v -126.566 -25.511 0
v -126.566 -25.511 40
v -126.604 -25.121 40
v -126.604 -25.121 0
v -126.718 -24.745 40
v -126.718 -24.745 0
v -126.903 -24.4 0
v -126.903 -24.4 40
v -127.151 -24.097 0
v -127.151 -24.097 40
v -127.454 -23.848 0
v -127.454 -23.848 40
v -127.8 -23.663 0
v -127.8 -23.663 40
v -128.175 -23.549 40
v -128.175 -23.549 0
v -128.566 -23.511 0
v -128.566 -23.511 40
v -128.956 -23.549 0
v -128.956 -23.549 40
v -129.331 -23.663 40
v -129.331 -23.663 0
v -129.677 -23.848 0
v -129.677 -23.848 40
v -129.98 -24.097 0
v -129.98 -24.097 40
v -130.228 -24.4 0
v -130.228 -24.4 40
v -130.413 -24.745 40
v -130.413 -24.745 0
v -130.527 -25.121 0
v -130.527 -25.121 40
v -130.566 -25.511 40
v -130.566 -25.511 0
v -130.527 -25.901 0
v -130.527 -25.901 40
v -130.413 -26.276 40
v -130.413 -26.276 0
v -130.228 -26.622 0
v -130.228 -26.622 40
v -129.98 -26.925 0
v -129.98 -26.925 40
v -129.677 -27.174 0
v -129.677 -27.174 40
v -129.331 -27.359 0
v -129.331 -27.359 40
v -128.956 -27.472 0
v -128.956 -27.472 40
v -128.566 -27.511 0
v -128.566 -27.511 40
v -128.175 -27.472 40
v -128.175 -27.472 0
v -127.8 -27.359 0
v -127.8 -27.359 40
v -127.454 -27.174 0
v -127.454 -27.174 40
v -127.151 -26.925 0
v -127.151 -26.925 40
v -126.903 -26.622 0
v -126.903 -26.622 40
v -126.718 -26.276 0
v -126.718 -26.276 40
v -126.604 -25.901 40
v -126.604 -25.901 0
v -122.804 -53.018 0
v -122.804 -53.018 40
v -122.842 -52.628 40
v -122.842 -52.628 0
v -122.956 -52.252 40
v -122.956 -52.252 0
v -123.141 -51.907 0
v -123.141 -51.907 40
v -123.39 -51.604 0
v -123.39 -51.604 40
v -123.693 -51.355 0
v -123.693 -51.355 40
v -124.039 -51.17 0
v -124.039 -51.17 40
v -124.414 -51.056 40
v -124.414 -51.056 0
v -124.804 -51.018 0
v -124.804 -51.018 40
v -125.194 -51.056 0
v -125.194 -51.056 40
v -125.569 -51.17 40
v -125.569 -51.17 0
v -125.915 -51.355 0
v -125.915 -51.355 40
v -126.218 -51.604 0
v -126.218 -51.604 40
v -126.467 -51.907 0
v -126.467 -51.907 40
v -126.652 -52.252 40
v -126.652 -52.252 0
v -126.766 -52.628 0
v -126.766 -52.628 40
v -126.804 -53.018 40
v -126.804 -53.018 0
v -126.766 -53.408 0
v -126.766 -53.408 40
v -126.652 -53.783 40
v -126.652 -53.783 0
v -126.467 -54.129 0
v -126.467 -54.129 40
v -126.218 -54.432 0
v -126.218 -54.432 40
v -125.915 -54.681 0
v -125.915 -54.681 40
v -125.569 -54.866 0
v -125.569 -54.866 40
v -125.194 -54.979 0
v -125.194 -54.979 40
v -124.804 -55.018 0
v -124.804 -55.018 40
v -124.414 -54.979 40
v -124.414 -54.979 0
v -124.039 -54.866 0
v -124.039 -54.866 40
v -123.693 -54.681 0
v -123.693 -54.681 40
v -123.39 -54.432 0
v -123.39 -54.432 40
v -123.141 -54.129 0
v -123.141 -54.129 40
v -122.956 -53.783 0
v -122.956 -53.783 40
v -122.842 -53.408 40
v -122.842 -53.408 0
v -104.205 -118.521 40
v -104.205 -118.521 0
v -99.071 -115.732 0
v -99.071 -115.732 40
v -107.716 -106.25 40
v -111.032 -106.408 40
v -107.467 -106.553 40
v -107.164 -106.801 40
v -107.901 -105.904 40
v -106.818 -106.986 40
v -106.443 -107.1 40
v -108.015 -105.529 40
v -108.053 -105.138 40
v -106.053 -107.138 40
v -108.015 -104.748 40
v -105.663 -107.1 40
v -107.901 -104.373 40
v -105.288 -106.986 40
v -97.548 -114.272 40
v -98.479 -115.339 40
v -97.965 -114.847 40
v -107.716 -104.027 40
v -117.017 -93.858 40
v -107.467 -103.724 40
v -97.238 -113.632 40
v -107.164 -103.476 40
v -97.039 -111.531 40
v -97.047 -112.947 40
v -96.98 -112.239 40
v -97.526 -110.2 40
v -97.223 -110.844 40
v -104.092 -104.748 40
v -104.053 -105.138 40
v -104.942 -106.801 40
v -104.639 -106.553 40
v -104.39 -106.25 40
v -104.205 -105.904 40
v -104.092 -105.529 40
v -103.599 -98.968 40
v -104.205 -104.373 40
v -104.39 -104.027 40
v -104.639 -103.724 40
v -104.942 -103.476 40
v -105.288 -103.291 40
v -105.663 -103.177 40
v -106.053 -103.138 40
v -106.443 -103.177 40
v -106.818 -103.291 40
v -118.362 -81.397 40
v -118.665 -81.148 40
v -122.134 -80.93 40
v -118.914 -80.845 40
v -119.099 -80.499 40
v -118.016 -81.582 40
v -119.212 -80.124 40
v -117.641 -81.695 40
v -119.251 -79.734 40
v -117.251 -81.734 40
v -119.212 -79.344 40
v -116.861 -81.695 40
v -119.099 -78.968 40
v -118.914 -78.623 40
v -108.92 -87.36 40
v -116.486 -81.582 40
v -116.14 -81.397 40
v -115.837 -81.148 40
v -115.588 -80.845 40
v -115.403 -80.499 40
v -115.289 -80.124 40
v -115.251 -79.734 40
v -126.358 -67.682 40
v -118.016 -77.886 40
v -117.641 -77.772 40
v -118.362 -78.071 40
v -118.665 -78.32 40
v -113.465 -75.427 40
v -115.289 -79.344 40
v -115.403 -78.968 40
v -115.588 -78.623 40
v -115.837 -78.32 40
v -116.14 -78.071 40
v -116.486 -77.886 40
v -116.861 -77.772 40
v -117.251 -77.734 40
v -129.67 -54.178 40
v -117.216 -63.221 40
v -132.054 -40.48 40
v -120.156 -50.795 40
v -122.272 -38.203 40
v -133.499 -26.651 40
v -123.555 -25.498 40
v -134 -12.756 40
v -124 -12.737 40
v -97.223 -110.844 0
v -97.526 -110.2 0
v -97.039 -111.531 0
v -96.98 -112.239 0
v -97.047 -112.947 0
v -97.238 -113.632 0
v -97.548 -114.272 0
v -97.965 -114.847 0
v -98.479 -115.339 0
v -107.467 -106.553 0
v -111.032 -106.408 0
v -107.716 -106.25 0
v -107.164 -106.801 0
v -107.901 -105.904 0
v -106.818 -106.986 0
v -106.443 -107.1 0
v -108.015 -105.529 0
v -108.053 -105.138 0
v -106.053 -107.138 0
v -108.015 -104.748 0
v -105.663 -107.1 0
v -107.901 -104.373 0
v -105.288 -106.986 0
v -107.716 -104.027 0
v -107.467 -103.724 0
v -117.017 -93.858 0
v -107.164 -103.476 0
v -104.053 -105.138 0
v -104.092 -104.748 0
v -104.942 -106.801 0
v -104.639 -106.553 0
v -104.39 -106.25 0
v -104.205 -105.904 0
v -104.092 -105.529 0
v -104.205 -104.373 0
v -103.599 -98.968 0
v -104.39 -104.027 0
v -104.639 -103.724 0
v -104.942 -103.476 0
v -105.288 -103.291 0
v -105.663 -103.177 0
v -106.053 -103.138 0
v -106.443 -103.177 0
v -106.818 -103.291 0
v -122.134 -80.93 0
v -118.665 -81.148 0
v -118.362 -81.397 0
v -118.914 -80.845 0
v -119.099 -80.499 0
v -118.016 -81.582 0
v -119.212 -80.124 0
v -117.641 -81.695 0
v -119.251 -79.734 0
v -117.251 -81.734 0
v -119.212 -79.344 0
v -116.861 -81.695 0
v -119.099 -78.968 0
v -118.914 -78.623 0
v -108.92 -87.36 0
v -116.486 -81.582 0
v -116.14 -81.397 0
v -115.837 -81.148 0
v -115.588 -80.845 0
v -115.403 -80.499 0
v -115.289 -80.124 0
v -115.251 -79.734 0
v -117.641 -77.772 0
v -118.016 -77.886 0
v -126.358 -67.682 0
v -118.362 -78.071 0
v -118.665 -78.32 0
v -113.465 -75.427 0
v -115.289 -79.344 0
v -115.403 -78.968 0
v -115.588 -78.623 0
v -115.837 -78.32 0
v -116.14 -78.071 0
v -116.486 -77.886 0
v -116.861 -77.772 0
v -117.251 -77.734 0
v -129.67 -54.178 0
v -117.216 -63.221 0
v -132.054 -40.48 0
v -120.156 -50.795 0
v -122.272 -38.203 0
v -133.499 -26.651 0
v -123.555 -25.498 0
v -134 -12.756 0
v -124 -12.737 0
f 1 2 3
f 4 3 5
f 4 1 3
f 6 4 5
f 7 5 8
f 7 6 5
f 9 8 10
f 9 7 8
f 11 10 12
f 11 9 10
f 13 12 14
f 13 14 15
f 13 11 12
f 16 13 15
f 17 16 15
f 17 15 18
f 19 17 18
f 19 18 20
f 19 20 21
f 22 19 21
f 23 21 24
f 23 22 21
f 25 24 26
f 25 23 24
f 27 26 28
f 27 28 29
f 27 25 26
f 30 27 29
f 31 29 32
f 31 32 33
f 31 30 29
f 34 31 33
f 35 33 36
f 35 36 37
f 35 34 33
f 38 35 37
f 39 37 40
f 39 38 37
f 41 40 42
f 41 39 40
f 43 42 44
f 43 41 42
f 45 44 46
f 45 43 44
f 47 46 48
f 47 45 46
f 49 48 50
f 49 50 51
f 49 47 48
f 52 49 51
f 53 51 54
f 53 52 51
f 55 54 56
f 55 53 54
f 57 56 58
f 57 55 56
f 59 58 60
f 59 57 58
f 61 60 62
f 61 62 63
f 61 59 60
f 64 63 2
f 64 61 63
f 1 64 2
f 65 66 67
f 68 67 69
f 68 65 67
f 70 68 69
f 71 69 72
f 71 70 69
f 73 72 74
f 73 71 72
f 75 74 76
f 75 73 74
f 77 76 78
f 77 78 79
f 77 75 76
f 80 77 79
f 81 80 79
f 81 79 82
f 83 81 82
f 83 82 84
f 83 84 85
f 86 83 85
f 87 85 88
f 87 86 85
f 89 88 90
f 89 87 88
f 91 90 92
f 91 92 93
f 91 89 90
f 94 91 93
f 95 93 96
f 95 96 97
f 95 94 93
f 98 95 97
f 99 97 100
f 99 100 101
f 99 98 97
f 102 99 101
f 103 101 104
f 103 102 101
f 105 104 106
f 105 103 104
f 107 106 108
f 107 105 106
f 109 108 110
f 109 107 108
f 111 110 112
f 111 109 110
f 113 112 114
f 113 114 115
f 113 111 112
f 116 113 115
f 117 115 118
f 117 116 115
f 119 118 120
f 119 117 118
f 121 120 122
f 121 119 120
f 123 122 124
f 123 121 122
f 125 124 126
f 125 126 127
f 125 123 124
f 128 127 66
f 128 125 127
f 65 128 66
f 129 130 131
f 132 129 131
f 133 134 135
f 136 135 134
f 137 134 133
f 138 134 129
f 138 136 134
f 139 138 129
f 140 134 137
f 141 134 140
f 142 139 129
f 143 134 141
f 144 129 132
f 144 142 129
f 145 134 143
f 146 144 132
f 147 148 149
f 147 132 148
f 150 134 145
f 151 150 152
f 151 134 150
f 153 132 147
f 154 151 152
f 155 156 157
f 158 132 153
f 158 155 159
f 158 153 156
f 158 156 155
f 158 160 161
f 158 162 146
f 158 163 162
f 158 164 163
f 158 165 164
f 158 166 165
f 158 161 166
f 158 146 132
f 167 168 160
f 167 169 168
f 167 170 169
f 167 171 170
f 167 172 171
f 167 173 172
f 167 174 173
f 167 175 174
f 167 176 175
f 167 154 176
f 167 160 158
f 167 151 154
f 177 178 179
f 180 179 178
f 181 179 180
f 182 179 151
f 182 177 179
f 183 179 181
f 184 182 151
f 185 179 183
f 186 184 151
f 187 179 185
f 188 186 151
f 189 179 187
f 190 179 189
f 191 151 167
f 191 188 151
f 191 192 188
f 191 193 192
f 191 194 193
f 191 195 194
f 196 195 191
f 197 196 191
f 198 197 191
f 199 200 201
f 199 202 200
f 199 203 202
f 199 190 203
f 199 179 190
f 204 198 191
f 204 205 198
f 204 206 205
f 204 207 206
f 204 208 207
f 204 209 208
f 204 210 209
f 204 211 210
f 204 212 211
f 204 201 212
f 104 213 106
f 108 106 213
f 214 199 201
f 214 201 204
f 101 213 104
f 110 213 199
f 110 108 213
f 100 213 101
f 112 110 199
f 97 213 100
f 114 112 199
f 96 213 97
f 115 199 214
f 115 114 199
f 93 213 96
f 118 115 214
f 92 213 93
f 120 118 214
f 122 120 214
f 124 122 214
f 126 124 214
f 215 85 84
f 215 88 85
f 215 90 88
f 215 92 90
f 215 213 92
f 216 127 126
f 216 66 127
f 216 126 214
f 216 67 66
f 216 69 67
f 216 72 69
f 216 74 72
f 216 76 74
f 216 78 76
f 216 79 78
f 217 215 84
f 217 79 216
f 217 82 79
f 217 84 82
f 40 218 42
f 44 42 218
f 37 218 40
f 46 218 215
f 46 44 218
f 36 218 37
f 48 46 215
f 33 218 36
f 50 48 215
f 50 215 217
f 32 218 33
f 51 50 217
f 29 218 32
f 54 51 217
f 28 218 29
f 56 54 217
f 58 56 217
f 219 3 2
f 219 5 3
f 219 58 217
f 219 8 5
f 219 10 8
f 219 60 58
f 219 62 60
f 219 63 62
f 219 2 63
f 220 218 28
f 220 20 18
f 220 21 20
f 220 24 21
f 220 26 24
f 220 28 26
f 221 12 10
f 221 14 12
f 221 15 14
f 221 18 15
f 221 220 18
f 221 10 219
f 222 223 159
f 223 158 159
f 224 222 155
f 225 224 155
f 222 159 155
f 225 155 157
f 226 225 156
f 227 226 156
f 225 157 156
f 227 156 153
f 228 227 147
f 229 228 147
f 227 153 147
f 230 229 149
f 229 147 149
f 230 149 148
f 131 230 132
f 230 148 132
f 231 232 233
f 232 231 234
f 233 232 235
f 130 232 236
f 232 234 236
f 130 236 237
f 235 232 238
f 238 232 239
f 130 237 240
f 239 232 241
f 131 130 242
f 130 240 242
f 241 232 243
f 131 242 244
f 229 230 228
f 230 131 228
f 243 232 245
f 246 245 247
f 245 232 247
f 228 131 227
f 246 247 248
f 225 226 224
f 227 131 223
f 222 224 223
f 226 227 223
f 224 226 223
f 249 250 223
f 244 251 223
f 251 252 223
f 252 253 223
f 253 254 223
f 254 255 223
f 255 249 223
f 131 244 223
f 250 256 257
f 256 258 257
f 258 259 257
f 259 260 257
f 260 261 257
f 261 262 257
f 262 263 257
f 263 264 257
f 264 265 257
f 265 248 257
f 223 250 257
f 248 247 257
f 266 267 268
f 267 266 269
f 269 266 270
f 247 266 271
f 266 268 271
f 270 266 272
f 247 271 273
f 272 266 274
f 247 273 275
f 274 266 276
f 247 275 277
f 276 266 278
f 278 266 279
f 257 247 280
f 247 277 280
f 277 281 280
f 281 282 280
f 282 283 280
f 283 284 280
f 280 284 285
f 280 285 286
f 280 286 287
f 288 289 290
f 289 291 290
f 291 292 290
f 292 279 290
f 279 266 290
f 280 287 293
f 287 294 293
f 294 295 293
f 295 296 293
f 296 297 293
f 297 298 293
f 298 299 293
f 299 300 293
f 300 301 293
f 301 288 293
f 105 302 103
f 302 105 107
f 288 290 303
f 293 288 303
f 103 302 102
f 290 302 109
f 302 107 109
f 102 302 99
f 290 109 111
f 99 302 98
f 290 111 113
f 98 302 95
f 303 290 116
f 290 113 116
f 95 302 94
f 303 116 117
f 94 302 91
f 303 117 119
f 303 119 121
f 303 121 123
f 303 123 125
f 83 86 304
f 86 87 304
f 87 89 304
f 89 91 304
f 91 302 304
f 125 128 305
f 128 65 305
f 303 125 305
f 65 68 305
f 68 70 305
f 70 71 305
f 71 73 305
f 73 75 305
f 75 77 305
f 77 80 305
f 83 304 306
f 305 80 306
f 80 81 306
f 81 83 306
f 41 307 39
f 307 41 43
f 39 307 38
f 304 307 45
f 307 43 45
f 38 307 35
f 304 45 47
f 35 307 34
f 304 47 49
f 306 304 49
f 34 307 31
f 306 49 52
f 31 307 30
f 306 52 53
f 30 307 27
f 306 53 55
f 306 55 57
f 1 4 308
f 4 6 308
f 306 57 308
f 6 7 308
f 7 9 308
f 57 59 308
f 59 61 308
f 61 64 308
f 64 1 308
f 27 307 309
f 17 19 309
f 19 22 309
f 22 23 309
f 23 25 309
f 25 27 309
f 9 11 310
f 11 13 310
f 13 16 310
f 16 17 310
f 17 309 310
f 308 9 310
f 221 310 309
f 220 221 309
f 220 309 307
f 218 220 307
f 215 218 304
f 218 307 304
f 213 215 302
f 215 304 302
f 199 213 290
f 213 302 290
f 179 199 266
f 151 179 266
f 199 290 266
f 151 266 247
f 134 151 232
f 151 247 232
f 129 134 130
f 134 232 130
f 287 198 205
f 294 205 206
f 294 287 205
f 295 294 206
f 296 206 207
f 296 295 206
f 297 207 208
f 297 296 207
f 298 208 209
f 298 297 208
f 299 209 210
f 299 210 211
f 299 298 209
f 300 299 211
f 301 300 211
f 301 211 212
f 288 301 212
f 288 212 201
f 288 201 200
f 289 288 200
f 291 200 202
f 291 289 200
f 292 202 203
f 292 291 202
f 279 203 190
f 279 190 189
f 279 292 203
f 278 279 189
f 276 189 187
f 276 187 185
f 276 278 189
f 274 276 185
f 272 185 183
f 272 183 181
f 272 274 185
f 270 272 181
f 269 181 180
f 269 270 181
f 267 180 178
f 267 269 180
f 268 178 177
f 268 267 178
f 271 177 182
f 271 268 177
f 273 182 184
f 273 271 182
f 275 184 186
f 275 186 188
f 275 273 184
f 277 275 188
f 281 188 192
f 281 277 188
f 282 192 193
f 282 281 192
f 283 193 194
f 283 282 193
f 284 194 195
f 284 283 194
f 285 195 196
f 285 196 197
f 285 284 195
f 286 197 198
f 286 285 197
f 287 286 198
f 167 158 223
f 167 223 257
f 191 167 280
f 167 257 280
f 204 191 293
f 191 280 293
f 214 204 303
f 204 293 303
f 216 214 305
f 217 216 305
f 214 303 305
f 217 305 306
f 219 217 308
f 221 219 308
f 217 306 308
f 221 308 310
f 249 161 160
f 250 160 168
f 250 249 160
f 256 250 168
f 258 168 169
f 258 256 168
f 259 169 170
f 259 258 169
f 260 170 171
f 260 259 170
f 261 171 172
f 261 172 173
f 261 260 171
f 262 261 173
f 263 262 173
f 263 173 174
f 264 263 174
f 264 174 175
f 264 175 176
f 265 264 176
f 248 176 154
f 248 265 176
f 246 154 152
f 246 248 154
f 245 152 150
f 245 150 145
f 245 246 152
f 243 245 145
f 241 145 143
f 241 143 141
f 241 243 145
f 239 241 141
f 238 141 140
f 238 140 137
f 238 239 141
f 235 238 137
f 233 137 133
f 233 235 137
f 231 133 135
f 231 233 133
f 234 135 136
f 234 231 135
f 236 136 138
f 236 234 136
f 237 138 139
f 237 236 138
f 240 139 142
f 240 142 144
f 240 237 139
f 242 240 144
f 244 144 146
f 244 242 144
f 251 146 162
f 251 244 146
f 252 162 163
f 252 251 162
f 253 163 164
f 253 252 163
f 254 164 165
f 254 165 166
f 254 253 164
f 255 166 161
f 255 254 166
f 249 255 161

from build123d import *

# Parameters (mm, degrees)
SKETCH1_R           = 2
BOSS_EXTRUDE1_DEPTH = 40
FILLET1_R           = 4


with BuildPart() as part:
    # Sketch1 → Boss-Extrude1 (new body)
    with BuildSketch(Plane.XY):
        with BuildLine():
            Line((-123.999650399, -12.7366), (-133.999632379, -12.755584536))
            ThreePointArc((-133.999632379, -12.755584536), (-126.357727013, -67.682340192), (-104.205340418, -118.521488224))
            Line((-104.205340418, -118.521488224), (-95.406545634, -113.742234823))
            ThreePointArc((-95.406545634, -113.742234823), (-116.664774404, -65.210158377), (-123.999650399, -12.7366))
        make_face()
        with Locations((-128.565543545, -25.510785173)):
            Circle(SKETCH1_R, mode=Mode.SUBTRACT)
        with Locations((-124.80403691, -53.01786585)):
            Circle(SKETCH1_R, mode=Mode.SUBTRACT)
        with Locations((-117.250891281, -79.733748965)):
            Circle(SKETCH1_R, mode=Mode.SUBTRACT)
        with Locations((-106.053120049, -105.138440244)):
            Circle(SKETCH1_R, mode=Mode.SUBTRACT)
    extrude(amount=BOSS_EXTRUDE1_DEPTH)

    # Fillet1
    fillet1_edges = [part.edges().sort_by_distance(p)[0] for p in [
        (-95.406545634, -113.742234823, 20),
    ]]
    fillet(fillet1_edges, radius=FILLET1_R)


solid = part.part
